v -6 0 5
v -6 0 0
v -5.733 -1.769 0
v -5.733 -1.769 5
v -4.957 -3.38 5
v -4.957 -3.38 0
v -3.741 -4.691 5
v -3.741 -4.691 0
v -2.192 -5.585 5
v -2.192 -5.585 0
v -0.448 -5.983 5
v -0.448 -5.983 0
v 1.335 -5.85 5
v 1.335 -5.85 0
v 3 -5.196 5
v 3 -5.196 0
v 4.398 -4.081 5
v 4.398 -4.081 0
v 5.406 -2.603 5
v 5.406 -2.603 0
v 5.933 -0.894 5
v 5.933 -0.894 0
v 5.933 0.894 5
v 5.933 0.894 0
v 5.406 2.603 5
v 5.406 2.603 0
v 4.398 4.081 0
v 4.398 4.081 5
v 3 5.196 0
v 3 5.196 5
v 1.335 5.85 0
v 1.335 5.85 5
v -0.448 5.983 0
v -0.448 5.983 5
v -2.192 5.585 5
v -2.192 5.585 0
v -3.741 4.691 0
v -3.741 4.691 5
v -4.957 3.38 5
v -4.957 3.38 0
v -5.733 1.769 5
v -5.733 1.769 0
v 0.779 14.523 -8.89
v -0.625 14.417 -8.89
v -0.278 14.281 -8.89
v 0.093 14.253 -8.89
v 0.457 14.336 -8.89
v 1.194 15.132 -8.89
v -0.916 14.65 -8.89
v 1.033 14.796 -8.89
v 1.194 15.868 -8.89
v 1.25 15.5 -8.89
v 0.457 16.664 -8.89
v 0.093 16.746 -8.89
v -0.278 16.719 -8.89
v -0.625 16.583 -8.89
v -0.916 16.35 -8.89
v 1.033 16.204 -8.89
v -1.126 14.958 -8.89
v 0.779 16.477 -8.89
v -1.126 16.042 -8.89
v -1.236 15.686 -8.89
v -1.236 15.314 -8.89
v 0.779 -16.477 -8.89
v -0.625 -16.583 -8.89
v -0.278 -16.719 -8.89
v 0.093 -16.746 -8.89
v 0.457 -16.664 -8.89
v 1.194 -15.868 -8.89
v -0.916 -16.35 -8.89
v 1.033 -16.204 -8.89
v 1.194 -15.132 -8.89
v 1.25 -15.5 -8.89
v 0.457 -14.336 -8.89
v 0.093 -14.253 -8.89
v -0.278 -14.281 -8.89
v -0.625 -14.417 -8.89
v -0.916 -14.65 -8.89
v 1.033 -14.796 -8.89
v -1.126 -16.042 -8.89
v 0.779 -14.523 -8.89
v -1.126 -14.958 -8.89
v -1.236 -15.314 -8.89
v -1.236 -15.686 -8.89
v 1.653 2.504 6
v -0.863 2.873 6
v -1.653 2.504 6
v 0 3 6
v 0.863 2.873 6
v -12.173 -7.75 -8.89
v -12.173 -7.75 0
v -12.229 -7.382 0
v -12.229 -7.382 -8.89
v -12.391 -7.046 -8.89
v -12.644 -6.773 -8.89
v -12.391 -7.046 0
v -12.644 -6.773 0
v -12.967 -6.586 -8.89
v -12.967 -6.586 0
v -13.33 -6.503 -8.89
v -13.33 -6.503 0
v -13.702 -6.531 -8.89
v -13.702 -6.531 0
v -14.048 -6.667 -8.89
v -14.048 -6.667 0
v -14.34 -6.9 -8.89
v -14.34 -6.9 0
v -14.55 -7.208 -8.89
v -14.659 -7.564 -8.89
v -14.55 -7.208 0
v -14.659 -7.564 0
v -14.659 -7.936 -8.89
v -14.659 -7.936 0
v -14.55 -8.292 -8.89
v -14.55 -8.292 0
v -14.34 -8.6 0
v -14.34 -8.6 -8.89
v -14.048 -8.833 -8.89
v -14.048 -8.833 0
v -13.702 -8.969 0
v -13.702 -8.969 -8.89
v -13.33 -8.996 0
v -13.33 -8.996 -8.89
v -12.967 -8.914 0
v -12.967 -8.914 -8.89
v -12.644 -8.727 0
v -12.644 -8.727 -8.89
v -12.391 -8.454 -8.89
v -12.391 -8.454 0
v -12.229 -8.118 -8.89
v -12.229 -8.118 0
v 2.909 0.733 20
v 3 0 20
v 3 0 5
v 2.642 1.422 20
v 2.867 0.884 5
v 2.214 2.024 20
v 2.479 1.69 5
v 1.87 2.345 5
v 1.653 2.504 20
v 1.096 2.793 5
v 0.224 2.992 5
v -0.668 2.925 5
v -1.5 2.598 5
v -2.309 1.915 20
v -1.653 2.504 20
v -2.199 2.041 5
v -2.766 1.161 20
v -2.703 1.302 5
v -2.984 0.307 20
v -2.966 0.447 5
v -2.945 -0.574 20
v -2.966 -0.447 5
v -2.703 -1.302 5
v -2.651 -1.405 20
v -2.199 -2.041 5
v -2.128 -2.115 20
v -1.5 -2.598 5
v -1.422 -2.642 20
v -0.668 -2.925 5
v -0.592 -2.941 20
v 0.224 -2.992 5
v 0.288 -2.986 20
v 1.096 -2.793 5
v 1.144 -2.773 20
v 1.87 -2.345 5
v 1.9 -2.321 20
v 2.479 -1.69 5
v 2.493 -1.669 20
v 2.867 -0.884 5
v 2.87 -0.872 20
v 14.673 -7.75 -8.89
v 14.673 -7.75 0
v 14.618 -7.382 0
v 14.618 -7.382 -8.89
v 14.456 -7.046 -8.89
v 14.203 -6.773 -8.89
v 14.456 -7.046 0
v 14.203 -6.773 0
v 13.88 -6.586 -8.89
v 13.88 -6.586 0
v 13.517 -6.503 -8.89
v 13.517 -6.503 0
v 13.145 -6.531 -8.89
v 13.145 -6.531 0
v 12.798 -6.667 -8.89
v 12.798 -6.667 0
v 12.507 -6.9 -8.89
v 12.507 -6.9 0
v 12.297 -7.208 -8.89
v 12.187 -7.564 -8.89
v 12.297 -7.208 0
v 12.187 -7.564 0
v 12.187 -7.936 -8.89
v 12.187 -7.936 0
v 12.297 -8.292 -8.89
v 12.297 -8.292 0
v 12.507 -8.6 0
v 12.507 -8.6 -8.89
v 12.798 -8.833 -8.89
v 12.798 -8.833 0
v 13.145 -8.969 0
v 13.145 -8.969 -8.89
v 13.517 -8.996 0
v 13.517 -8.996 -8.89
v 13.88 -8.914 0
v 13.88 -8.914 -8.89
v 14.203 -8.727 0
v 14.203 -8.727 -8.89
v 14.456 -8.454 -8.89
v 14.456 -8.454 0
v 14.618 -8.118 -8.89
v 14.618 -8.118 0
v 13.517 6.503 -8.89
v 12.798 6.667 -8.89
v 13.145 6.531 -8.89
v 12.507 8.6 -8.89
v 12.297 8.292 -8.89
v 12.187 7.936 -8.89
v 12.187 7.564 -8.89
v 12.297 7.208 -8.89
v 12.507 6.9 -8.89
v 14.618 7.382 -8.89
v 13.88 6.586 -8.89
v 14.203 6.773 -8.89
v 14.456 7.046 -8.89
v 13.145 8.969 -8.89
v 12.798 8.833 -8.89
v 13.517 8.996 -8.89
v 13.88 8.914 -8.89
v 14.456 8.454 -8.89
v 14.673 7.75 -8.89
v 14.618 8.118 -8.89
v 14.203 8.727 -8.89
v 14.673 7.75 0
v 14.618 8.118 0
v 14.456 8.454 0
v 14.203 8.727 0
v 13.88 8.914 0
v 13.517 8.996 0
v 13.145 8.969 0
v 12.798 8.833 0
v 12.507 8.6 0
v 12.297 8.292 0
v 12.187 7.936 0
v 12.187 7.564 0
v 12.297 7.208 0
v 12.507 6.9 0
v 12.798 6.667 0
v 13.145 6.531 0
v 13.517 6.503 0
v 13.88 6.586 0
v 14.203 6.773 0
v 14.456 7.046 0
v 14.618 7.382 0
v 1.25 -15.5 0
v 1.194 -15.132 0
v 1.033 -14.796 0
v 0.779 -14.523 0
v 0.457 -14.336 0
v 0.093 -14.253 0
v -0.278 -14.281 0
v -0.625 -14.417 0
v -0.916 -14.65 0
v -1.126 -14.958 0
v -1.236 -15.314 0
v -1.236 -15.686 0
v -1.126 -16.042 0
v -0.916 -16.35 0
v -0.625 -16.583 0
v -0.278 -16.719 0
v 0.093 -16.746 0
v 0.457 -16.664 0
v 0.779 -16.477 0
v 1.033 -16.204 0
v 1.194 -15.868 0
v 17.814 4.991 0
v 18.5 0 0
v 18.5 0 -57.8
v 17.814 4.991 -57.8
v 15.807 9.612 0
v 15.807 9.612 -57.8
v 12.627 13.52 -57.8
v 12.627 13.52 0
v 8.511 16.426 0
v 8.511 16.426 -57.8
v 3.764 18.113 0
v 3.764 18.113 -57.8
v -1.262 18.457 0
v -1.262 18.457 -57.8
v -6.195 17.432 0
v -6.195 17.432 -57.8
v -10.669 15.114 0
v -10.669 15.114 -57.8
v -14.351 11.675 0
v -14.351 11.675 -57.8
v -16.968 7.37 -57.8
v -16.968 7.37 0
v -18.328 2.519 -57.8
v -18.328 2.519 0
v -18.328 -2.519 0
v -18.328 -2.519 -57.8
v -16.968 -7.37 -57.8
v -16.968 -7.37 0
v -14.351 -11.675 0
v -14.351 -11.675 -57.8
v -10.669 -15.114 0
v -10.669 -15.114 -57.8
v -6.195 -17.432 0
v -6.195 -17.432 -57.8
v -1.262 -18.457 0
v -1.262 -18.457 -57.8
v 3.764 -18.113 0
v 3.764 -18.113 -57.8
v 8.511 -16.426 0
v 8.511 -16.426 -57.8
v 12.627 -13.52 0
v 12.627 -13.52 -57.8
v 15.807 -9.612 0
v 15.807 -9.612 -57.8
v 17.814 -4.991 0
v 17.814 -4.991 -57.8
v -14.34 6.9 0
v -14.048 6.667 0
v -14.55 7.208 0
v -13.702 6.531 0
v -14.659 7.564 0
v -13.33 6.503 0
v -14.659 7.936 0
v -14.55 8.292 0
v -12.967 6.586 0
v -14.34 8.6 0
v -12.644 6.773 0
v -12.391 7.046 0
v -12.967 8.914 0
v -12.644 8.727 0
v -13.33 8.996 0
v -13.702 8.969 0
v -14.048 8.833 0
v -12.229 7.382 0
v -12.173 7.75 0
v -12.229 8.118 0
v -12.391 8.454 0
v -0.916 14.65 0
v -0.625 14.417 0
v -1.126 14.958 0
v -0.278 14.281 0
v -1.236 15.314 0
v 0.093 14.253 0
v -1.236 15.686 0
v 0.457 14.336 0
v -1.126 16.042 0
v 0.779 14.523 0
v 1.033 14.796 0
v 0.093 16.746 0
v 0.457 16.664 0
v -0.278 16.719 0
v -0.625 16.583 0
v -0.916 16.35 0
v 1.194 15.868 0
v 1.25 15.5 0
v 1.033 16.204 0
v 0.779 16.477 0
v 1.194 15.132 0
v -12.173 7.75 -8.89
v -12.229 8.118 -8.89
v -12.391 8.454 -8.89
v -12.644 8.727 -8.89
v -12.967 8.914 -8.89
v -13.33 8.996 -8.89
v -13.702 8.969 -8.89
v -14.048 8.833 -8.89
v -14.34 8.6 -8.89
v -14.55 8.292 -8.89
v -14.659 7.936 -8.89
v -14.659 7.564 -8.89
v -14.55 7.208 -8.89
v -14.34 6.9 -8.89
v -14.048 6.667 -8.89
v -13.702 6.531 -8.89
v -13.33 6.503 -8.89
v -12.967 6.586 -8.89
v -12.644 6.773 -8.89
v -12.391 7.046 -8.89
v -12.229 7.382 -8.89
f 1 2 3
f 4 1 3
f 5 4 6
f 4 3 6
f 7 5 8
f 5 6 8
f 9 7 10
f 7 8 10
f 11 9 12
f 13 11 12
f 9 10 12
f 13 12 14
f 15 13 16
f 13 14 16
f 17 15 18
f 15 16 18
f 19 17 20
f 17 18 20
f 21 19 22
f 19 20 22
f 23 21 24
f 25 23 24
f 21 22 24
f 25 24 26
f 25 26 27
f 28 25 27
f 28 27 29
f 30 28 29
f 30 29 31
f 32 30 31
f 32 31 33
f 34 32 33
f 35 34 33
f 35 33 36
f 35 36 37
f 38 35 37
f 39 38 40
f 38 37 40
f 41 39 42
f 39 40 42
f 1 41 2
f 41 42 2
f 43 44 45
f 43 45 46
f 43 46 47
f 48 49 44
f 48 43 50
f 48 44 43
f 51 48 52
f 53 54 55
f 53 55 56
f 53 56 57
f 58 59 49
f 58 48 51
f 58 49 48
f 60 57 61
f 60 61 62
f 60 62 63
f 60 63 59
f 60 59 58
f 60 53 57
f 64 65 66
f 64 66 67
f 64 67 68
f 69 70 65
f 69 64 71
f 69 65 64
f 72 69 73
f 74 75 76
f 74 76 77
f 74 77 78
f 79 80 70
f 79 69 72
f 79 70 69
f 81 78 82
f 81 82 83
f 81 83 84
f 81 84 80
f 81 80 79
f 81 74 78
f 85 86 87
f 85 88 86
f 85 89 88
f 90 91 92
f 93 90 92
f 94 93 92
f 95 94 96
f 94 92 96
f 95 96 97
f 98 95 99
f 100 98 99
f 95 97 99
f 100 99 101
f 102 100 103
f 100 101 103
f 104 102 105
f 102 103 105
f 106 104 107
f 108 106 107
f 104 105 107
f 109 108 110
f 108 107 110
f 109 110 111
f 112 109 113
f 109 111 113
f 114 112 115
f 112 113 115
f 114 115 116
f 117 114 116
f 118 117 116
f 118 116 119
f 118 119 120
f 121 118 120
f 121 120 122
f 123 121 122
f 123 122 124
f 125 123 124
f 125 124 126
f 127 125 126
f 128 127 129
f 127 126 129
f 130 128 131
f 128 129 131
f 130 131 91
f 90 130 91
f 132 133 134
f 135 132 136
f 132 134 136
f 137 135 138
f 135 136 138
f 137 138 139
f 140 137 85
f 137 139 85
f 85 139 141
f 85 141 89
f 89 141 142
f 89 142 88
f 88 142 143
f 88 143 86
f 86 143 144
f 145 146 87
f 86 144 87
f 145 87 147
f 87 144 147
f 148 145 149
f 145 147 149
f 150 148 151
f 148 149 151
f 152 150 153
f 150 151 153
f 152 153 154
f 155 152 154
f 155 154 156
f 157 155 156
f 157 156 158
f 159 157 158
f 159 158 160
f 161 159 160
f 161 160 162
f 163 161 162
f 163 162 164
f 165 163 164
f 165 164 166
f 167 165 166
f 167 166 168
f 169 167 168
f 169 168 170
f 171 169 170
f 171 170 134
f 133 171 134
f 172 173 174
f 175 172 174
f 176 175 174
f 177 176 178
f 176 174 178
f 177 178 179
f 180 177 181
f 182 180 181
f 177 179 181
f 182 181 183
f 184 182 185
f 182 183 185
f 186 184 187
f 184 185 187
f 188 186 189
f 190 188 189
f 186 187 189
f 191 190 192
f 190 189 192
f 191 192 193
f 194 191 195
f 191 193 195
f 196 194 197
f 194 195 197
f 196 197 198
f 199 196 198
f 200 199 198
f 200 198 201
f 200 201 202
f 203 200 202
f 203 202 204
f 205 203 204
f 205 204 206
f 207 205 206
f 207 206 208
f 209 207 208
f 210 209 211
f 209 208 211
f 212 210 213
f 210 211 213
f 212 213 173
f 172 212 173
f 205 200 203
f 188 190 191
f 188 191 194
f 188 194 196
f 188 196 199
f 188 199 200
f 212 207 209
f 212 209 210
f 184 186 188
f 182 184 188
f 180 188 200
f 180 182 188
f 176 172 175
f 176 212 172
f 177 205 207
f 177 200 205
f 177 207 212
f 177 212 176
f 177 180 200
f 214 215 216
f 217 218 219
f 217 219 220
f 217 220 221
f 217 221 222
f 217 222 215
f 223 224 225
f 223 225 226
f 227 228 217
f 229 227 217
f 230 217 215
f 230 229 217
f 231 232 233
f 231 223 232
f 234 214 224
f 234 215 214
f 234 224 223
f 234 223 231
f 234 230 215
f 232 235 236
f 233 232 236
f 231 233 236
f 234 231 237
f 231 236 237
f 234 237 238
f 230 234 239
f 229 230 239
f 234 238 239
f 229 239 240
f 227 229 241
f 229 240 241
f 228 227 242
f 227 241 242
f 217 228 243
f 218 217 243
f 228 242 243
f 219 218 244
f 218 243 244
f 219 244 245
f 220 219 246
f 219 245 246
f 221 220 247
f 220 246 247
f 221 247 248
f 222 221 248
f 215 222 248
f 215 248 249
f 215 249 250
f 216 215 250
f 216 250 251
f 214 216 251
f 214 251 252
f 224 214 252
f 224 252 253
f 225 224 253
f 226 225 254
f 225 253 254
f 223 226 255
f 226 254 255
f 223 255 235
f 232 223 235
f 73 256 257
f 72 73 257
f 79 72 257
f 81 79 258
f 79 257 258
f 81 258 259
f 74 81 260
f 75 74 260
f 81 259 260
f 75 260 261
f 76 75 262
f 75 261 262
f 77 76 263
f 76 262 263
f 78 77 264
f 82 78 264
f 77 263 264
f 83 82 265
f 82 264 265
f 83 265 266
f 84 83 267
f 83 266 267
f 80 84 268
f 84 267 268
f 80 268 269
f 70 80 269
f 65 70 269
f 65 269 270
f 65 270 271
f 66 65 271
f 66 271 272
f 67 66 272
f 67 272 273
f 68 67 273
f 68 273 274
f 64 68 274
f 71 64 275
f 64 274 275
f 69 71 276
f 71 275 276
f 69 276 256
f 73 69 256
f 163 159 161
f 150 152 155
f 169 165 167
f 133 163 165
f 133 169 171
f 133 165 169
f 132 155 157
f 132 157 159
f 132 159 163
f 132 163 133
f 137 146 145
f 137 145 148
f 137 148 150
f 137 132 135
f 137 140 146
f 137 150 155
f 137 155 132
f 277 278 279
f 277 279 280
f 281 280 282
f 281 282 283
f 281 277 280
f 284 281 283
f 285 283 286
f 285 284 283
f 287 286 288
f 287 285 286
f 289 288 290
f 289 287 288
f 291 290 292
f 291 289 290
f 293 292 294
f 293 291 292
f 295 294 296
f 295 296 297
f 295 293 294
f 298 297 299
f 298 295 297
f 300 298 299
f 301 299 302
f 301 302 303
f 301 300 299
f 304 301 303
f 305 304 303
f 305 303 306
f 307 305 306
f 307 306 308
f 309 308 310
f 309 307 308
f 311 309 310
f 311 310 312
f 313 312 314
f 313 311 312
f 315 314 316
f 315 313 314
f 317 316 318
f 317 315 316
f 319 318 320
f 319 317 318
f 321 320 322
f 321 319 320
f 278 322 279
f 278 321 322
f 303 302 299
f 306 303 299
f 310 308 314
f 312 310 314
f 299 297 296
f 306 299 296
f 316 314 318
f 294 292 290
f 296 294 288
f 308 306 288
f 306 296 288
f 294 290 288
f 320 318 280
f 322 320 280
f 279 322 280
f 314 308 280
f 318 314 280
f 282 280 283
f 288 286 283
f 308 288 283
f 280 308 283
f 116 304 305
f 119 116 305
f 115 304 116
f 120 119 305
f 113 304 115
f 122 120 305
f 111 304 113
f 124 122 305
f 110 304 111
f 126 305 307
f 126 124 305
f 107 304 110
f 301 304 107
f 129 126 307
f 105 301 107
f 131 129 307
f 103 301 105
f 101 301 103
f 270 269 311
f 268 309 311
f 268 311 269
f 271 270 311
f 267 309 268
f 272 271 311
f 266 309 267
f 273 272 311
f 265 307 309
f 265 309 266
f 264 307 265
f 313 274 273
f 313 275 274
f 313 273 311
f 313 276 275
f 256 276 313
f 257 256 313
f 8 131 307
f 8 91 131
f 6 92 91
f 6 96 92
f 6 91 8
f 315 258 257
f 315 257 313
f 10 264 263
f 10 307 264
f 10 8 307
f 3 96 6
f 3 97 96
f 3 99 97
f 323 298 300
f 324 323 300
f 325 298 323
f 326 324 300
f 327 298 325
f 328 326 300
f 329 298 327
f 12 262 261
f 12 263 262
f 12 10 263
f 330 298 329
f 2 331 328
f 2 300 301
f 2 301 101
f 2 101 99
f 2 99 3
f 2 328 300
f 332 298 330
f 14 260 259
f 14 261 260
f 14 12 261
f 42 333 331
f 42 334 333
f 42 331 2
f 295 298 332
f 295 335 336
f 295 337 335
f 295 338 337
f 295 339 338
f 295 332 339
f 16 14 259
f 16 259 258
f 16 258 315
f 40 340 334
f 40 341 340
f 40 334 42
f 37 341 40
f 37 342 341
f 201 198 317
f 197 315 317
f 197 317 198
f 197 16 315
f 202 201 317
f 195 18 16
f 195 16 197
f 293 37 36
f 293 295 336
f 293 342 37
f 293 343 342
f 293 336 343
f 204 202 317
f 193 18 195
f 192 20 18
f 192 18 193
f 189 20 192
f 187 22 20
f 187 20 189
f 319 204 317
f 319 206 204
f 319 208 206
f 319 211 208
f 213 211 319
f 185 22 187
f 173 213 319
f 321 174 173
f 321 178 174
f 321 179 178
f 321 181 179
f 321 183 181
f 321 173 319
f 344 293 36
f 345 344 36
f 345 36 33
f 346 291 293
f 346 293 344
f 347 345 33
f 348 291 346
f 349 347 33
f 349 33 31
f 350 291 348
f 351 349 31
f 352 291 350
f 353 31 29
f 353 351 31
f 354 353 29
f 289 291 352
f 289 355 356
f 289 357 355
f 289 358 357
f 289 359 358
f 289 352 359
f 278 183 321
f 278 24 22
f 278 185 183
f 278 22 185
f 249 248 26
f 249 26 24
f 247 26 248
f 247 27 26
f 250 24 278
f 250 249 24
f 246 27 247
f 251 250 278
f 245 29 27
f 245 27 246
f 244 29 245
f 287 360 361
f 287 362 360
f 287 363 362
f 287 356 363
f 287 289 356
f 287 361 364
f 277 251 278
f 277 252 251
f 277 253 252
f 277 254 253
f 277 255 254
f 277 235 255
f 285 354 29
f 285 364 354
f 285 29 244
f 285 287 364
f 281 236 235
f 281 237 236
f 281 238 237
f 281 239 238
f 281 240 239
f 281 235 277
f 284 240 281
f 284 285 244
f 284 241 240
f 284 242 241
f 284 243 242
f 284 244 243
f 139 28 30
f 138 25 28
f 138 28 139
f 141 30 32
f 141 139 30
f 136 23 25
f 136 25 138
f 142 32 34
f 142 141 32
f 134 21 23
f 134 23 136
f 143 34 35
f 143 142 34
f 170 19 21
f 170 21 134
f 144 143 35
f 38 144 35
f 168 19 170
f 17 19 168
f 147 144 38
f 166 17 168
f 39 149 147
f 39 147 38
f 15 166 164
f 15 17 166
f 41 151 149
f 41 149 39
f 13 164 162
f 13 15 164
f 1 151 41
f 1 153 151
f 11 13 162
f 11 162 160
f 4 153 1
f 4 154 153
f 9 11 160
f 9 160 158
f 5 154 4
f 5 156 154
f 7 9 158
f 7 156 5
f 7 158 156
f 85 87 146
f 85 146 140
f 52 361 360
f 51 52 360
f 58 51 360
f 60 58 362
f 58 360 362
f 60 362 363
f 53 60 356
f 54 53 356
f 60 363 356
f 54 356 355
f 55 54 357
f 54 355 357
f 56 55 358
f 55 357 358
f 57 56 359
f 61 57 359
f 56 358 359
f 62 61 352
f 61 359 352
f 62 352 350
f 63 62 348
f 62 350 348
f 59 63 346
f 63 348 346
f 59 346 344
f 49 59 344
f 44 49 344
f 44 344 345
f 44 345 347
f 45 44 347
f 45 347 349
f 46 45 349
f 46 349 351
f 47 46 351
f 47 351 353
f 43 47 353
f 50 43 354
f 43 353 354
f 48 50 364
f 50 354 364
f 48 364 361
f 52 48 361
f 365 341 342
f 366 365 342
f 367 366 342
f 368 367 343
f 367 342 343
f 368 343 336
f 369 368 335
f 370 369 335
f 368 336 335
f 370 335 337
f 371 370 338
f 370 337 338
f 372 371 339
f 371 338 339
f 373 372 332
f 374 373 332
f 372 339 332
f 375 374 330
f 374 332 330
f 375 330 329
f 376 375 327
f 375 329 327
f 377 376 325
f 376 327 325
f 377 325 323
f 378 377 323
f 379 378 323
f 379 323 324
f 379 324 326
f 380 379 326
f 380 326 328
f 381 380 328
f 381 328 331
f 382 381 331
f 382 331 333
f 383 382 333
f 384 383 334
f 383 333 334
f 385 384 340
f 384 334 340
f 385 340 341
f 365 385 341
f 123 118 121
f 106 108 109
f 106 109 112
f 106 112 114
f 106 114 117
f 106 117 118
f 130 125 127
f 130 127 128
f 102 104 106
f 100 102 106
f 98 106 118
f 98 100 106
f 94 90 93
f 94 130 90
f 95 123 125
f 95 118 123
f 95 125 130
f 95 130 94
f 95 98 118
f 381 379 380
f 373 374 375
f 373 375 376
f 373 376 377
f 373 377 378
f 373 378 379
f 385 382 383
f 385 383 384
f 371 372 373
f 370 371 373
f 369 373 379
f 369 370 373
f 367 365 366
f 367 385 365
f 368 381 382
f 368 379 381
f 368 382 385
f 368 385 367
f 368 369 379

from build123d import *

# Parameters (mm, degrees)
SKETCH3_R           = 18.499963
BOSS_EXTRUDE1_DEPTH = 57.8000114
SKETCH4_R           = 2.999994
BOSS_EXTRUDE2_DEPTH = 20.00001334
SKETCH6_R           = 6.0000007
BOSS_EXTRUDE3_DEPTH = 5.0000154
SKETCH8_R           = 1.25000004
CUT_EXTRUDE3_DEPTH  = 8.89
SKETCH7_W           = 3.305573972
SKETCH7_H           = 0.499999
CUT_EXTRUDE4_DEPTH  = 13.9999974


with BuildPart() as part:
    # Sketch3 → Boss-Extrude1 (new body)
    with BuildSketch(Plane.XY):
        Circle(SKETCH3_R)
    extrude(amount=-BOSS_EXTRUDE1_DEPTH)

    # Sketch4 → Boss-Extrude2 (add)
    with BuildSketch(Plane.XY):
        Circle(SKETCH4_R)
    extrude(amount=BOSS_EXTRUDE2_DEPTH)

    # Sketch6 → Boss-Extrude3 (add)
    with BuildSketch(Plane.XY):
        with Locations(Location((0, 0, 0), (0, 0, 180))):
            Circle(SKETCH6_R)
    extrude(amount=BOSS_EXTRUDE3_DEPTH)

    # Sketch8 → Cut-Extrude3 (cut)
    with BuildSketch(Plane.XY):
        with Locations((0, 15.499969)):
            Circle(SKETCH8_R)
        with Locations((13.423366912, 7.7499845)):
            Circle(SKETCH8_R)
        with Locations((13.423366912, -7.7499845)):
            Circle(SKETCH8_R)
        with Locations((0, -15.499969)):
            Circle(SKETCH8_R)
        with Locations((-13.423366912, -7.7499845)):
            Circle(SKETCH8_R)
        with Locations((-13.423366912, 7.7499845)):
            Circle(SKETCH8_R)
    extrude(amount=-CUT_EXTRUDE3_DEPTH, mode=Mode.SUBTRACT)

    # Sketch7 → Cut-Extrude4 (cut)
    with BuildSketch(Plane.XY.offset(20.00001334)):
        with Locations((0, 2.753648673)):
            Rectangle(SKETCH7_W, SKETCH7_H)
    extrude(amount=-CUT_EXTRUDE4_DEPTH, mode=Mode.SUBTRACT)


solid = part.part
